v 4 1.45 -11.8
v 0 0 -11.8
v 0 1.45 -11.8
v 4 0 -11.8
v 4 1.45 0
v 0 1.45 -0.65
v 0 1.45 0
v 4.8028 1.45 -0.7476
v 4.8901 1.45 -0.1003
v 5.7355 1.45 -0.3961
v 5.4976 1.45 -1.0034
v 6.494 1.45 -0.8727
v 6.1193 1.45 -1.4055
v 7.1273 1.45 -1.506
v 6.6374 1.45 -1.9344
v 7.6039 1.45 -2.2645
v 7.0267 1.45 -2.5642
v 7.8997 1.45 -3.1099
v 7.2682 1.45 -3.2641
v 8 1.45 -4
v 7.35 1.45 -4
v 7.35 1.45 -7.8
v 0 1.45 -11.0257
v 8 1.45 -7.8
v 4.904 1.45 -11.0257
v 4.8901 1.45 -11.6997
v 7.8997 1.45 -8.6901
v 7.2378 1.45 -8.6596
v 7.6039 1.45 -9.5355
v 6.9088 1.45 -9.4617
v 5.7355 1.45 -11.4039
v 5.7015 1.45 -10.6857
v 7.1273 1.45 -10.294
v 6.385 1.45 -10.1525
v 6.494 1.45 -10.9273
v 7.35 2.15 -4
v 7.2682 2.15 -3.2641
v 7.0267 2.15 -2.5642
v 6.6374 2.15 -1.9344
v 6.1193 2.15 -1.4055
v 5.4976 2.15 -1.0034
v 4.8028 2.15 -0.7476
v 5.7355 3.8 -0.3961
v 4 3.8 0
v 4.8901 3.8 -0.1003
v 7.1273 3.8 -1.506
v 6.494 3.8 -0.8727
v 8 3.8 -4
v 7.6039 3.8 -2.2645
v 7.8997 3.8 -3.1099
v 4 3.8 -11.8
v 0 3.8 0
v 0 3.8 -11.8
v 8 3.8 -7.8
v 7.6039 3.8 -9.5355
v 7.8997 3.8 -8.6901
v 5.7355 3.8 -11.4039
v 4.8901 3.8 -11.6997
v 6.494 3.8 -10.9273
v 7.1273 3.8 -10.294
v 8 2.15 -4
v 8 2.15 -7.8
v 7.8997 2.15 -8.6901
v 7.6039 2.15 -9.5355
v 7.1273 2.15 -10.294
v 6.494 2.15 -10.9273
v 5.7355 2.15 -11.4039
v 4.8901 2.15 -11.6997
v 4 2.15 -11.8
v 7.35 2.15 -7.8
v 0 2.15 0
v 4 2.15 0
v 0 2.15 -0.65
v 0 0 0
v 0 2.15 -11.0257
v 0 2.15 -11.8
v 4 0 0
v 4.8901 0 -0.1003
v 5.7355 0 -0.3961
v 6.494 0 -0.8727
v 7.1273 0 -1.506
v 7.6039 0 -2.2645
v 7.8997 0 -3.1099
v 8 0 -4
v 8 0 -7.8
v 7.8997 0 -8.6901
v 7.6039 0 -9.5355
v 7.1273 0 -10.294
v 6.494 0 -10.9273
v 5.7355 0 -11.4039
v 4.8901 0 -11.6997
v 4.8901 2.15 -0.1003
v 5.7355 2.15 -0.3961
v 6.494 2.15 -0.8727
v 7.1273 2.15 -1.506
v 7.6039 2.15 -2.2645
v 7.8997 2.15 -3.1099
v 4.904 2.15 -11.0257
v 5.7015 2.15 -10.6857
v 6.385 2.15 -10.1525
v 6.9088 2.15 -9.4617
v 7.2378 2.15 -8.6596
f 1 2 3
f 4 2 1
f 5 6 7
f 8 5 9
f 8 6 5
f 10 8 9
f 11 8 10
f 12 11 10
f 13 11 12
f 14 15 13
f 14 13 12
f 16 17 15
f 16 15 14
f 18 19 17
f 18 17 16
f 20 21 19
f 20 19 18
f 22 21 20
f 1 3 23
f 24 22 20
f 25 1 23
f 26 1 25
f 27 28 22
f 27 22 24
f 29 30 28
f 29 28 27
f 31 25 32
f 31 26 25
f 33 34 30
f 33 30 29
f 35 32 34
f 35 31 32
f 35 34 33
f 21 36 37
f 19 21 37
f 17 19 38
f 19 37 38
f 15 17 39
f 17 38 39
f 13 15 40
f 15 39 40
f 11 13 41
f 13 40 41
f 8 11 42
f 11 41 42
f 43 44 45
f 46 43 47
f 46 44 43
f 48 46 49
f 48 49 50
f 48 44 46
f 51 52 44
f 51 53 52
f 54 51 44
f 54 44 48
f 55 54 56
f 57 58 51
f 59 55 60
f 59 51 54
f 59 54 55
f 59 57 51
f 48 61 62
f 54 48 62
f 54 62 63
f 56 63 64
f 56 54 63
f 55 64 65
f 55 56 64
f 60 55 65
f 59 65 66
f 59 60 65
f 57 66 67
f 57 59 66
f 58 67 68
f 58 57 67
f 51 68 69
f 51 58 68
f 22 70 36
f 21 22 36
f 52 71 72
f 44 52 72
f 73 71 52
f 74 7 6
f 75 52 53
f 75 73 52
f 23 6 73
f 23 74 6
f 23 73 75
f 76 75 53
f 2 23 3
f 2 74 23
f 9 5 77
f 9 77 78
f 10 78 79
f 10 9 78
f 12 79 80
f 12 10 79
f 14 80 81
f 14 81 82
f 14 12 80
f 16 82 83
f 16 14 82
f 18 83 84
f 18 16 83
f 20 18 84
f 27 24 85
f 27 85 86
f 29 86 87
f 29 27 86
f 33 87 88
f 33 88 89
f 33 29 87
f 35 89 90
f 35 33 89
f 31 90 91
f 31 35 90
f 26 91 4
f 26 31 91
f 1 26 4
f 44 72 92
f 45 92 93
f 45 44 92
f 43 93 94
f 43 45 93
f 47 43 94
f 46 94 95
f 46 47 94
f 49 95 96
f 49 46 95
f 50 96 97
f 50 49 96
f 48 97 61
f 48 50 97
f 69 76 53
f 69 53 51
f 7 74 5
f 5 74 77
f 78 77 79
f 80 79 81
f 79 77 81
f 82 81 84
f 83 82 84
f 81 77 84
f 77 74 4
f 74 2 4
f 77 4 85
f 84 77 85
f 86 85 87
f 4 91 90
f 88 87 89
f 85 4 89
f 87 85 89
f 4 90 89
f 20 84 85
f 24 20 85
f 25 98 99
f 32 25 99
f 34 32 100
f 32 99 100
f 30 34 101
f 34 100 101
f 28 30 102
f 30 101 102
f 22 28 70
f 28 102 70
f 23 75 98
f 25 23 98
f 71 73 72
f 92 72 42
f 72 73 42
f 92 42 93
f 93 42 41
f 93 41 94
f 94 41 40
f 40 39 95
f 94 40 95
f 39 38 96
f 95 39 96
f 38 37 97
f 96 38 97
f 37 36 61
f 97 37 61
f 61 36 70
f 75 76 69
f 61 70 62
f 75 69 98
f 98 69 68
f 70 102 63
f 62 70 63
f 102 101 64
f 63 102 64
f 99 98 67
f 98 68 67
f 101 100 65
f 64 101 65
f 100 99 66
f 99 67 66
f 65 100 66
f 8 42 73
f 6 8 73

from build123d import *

# Parameters (mm, degrees)
SKETCH_1_W          = 8
SKETCH_1_H          = 11.8
EXTRUDE_1_DEPTH     = 3.8
FILLET_1_R          = 4
CUT_EXTRUDE_1_DEPTH = 0.35


with BuildPart() as part:
    # 草圖1 → 填料-伸長1 (new body)
    with BuildSketch(Plane(origin=(0, 0, 0), x_dir=(1, 0, 0), z_dir=(0, 1, 0))):
        with Locations((4, 5.9)):
            Rectangle(SKETCH_1_W, SKETCH_1_H)
    extrude(amount=EXTRUDE_1_DEPTH)

    # 圓角1
    fillet_1_edges = [part.edges().sort_by_distance(p)[0] for p in [
        (8, 1.9, -11.8),
        (8, 1.9, 0),
    ]]
    fillet(fillet_1_edges, radius=FILLET_1_R)

    # 草圖2 → 除料-伸長1 (cut, symmetric)
    with BuildSketch(Plane(origin=(0, 1.8, 0), x_dir=(1, 0, 0), z_dir=(0, 1, 0))):
        with BuildLine():
            Line((0, 11.8), (0, 11.025723127))
            Line((0, 11.025723127), (4.903996853, 11.025723127))
            ThreePointArc((4.903996853, 11.025723127), (6.669352867, 9.824118394), (7.35, 7.8))
            Line((7.35, 7.8), (7.35, 4))
            ThreePointArc((7.35, 4), (6.637408845, 1.934431172), (4.802791293, 0.74761224))
            Line((4.802791293, 0.74761224), (0, 0.65))
            Line((0, 0.65), (0, 0))
            Line((0, 0), (4, 0))
            ThreePointArc((4, 0), (6.828427125, 1.171572875), (8, 4))
            Line((8, 4), (8, 7.8))
            ThreePointArc((8, 7.8), (6.828427125, 10.628427125), (4, 11.8))
            Line((4, 11.8), (0, 11.8))
        make_face()
    extrude(amount=CUT_EXTRUDE_1_DEPTH, both=True, mode=Mode.SUBTRACT)


solid = part.part
